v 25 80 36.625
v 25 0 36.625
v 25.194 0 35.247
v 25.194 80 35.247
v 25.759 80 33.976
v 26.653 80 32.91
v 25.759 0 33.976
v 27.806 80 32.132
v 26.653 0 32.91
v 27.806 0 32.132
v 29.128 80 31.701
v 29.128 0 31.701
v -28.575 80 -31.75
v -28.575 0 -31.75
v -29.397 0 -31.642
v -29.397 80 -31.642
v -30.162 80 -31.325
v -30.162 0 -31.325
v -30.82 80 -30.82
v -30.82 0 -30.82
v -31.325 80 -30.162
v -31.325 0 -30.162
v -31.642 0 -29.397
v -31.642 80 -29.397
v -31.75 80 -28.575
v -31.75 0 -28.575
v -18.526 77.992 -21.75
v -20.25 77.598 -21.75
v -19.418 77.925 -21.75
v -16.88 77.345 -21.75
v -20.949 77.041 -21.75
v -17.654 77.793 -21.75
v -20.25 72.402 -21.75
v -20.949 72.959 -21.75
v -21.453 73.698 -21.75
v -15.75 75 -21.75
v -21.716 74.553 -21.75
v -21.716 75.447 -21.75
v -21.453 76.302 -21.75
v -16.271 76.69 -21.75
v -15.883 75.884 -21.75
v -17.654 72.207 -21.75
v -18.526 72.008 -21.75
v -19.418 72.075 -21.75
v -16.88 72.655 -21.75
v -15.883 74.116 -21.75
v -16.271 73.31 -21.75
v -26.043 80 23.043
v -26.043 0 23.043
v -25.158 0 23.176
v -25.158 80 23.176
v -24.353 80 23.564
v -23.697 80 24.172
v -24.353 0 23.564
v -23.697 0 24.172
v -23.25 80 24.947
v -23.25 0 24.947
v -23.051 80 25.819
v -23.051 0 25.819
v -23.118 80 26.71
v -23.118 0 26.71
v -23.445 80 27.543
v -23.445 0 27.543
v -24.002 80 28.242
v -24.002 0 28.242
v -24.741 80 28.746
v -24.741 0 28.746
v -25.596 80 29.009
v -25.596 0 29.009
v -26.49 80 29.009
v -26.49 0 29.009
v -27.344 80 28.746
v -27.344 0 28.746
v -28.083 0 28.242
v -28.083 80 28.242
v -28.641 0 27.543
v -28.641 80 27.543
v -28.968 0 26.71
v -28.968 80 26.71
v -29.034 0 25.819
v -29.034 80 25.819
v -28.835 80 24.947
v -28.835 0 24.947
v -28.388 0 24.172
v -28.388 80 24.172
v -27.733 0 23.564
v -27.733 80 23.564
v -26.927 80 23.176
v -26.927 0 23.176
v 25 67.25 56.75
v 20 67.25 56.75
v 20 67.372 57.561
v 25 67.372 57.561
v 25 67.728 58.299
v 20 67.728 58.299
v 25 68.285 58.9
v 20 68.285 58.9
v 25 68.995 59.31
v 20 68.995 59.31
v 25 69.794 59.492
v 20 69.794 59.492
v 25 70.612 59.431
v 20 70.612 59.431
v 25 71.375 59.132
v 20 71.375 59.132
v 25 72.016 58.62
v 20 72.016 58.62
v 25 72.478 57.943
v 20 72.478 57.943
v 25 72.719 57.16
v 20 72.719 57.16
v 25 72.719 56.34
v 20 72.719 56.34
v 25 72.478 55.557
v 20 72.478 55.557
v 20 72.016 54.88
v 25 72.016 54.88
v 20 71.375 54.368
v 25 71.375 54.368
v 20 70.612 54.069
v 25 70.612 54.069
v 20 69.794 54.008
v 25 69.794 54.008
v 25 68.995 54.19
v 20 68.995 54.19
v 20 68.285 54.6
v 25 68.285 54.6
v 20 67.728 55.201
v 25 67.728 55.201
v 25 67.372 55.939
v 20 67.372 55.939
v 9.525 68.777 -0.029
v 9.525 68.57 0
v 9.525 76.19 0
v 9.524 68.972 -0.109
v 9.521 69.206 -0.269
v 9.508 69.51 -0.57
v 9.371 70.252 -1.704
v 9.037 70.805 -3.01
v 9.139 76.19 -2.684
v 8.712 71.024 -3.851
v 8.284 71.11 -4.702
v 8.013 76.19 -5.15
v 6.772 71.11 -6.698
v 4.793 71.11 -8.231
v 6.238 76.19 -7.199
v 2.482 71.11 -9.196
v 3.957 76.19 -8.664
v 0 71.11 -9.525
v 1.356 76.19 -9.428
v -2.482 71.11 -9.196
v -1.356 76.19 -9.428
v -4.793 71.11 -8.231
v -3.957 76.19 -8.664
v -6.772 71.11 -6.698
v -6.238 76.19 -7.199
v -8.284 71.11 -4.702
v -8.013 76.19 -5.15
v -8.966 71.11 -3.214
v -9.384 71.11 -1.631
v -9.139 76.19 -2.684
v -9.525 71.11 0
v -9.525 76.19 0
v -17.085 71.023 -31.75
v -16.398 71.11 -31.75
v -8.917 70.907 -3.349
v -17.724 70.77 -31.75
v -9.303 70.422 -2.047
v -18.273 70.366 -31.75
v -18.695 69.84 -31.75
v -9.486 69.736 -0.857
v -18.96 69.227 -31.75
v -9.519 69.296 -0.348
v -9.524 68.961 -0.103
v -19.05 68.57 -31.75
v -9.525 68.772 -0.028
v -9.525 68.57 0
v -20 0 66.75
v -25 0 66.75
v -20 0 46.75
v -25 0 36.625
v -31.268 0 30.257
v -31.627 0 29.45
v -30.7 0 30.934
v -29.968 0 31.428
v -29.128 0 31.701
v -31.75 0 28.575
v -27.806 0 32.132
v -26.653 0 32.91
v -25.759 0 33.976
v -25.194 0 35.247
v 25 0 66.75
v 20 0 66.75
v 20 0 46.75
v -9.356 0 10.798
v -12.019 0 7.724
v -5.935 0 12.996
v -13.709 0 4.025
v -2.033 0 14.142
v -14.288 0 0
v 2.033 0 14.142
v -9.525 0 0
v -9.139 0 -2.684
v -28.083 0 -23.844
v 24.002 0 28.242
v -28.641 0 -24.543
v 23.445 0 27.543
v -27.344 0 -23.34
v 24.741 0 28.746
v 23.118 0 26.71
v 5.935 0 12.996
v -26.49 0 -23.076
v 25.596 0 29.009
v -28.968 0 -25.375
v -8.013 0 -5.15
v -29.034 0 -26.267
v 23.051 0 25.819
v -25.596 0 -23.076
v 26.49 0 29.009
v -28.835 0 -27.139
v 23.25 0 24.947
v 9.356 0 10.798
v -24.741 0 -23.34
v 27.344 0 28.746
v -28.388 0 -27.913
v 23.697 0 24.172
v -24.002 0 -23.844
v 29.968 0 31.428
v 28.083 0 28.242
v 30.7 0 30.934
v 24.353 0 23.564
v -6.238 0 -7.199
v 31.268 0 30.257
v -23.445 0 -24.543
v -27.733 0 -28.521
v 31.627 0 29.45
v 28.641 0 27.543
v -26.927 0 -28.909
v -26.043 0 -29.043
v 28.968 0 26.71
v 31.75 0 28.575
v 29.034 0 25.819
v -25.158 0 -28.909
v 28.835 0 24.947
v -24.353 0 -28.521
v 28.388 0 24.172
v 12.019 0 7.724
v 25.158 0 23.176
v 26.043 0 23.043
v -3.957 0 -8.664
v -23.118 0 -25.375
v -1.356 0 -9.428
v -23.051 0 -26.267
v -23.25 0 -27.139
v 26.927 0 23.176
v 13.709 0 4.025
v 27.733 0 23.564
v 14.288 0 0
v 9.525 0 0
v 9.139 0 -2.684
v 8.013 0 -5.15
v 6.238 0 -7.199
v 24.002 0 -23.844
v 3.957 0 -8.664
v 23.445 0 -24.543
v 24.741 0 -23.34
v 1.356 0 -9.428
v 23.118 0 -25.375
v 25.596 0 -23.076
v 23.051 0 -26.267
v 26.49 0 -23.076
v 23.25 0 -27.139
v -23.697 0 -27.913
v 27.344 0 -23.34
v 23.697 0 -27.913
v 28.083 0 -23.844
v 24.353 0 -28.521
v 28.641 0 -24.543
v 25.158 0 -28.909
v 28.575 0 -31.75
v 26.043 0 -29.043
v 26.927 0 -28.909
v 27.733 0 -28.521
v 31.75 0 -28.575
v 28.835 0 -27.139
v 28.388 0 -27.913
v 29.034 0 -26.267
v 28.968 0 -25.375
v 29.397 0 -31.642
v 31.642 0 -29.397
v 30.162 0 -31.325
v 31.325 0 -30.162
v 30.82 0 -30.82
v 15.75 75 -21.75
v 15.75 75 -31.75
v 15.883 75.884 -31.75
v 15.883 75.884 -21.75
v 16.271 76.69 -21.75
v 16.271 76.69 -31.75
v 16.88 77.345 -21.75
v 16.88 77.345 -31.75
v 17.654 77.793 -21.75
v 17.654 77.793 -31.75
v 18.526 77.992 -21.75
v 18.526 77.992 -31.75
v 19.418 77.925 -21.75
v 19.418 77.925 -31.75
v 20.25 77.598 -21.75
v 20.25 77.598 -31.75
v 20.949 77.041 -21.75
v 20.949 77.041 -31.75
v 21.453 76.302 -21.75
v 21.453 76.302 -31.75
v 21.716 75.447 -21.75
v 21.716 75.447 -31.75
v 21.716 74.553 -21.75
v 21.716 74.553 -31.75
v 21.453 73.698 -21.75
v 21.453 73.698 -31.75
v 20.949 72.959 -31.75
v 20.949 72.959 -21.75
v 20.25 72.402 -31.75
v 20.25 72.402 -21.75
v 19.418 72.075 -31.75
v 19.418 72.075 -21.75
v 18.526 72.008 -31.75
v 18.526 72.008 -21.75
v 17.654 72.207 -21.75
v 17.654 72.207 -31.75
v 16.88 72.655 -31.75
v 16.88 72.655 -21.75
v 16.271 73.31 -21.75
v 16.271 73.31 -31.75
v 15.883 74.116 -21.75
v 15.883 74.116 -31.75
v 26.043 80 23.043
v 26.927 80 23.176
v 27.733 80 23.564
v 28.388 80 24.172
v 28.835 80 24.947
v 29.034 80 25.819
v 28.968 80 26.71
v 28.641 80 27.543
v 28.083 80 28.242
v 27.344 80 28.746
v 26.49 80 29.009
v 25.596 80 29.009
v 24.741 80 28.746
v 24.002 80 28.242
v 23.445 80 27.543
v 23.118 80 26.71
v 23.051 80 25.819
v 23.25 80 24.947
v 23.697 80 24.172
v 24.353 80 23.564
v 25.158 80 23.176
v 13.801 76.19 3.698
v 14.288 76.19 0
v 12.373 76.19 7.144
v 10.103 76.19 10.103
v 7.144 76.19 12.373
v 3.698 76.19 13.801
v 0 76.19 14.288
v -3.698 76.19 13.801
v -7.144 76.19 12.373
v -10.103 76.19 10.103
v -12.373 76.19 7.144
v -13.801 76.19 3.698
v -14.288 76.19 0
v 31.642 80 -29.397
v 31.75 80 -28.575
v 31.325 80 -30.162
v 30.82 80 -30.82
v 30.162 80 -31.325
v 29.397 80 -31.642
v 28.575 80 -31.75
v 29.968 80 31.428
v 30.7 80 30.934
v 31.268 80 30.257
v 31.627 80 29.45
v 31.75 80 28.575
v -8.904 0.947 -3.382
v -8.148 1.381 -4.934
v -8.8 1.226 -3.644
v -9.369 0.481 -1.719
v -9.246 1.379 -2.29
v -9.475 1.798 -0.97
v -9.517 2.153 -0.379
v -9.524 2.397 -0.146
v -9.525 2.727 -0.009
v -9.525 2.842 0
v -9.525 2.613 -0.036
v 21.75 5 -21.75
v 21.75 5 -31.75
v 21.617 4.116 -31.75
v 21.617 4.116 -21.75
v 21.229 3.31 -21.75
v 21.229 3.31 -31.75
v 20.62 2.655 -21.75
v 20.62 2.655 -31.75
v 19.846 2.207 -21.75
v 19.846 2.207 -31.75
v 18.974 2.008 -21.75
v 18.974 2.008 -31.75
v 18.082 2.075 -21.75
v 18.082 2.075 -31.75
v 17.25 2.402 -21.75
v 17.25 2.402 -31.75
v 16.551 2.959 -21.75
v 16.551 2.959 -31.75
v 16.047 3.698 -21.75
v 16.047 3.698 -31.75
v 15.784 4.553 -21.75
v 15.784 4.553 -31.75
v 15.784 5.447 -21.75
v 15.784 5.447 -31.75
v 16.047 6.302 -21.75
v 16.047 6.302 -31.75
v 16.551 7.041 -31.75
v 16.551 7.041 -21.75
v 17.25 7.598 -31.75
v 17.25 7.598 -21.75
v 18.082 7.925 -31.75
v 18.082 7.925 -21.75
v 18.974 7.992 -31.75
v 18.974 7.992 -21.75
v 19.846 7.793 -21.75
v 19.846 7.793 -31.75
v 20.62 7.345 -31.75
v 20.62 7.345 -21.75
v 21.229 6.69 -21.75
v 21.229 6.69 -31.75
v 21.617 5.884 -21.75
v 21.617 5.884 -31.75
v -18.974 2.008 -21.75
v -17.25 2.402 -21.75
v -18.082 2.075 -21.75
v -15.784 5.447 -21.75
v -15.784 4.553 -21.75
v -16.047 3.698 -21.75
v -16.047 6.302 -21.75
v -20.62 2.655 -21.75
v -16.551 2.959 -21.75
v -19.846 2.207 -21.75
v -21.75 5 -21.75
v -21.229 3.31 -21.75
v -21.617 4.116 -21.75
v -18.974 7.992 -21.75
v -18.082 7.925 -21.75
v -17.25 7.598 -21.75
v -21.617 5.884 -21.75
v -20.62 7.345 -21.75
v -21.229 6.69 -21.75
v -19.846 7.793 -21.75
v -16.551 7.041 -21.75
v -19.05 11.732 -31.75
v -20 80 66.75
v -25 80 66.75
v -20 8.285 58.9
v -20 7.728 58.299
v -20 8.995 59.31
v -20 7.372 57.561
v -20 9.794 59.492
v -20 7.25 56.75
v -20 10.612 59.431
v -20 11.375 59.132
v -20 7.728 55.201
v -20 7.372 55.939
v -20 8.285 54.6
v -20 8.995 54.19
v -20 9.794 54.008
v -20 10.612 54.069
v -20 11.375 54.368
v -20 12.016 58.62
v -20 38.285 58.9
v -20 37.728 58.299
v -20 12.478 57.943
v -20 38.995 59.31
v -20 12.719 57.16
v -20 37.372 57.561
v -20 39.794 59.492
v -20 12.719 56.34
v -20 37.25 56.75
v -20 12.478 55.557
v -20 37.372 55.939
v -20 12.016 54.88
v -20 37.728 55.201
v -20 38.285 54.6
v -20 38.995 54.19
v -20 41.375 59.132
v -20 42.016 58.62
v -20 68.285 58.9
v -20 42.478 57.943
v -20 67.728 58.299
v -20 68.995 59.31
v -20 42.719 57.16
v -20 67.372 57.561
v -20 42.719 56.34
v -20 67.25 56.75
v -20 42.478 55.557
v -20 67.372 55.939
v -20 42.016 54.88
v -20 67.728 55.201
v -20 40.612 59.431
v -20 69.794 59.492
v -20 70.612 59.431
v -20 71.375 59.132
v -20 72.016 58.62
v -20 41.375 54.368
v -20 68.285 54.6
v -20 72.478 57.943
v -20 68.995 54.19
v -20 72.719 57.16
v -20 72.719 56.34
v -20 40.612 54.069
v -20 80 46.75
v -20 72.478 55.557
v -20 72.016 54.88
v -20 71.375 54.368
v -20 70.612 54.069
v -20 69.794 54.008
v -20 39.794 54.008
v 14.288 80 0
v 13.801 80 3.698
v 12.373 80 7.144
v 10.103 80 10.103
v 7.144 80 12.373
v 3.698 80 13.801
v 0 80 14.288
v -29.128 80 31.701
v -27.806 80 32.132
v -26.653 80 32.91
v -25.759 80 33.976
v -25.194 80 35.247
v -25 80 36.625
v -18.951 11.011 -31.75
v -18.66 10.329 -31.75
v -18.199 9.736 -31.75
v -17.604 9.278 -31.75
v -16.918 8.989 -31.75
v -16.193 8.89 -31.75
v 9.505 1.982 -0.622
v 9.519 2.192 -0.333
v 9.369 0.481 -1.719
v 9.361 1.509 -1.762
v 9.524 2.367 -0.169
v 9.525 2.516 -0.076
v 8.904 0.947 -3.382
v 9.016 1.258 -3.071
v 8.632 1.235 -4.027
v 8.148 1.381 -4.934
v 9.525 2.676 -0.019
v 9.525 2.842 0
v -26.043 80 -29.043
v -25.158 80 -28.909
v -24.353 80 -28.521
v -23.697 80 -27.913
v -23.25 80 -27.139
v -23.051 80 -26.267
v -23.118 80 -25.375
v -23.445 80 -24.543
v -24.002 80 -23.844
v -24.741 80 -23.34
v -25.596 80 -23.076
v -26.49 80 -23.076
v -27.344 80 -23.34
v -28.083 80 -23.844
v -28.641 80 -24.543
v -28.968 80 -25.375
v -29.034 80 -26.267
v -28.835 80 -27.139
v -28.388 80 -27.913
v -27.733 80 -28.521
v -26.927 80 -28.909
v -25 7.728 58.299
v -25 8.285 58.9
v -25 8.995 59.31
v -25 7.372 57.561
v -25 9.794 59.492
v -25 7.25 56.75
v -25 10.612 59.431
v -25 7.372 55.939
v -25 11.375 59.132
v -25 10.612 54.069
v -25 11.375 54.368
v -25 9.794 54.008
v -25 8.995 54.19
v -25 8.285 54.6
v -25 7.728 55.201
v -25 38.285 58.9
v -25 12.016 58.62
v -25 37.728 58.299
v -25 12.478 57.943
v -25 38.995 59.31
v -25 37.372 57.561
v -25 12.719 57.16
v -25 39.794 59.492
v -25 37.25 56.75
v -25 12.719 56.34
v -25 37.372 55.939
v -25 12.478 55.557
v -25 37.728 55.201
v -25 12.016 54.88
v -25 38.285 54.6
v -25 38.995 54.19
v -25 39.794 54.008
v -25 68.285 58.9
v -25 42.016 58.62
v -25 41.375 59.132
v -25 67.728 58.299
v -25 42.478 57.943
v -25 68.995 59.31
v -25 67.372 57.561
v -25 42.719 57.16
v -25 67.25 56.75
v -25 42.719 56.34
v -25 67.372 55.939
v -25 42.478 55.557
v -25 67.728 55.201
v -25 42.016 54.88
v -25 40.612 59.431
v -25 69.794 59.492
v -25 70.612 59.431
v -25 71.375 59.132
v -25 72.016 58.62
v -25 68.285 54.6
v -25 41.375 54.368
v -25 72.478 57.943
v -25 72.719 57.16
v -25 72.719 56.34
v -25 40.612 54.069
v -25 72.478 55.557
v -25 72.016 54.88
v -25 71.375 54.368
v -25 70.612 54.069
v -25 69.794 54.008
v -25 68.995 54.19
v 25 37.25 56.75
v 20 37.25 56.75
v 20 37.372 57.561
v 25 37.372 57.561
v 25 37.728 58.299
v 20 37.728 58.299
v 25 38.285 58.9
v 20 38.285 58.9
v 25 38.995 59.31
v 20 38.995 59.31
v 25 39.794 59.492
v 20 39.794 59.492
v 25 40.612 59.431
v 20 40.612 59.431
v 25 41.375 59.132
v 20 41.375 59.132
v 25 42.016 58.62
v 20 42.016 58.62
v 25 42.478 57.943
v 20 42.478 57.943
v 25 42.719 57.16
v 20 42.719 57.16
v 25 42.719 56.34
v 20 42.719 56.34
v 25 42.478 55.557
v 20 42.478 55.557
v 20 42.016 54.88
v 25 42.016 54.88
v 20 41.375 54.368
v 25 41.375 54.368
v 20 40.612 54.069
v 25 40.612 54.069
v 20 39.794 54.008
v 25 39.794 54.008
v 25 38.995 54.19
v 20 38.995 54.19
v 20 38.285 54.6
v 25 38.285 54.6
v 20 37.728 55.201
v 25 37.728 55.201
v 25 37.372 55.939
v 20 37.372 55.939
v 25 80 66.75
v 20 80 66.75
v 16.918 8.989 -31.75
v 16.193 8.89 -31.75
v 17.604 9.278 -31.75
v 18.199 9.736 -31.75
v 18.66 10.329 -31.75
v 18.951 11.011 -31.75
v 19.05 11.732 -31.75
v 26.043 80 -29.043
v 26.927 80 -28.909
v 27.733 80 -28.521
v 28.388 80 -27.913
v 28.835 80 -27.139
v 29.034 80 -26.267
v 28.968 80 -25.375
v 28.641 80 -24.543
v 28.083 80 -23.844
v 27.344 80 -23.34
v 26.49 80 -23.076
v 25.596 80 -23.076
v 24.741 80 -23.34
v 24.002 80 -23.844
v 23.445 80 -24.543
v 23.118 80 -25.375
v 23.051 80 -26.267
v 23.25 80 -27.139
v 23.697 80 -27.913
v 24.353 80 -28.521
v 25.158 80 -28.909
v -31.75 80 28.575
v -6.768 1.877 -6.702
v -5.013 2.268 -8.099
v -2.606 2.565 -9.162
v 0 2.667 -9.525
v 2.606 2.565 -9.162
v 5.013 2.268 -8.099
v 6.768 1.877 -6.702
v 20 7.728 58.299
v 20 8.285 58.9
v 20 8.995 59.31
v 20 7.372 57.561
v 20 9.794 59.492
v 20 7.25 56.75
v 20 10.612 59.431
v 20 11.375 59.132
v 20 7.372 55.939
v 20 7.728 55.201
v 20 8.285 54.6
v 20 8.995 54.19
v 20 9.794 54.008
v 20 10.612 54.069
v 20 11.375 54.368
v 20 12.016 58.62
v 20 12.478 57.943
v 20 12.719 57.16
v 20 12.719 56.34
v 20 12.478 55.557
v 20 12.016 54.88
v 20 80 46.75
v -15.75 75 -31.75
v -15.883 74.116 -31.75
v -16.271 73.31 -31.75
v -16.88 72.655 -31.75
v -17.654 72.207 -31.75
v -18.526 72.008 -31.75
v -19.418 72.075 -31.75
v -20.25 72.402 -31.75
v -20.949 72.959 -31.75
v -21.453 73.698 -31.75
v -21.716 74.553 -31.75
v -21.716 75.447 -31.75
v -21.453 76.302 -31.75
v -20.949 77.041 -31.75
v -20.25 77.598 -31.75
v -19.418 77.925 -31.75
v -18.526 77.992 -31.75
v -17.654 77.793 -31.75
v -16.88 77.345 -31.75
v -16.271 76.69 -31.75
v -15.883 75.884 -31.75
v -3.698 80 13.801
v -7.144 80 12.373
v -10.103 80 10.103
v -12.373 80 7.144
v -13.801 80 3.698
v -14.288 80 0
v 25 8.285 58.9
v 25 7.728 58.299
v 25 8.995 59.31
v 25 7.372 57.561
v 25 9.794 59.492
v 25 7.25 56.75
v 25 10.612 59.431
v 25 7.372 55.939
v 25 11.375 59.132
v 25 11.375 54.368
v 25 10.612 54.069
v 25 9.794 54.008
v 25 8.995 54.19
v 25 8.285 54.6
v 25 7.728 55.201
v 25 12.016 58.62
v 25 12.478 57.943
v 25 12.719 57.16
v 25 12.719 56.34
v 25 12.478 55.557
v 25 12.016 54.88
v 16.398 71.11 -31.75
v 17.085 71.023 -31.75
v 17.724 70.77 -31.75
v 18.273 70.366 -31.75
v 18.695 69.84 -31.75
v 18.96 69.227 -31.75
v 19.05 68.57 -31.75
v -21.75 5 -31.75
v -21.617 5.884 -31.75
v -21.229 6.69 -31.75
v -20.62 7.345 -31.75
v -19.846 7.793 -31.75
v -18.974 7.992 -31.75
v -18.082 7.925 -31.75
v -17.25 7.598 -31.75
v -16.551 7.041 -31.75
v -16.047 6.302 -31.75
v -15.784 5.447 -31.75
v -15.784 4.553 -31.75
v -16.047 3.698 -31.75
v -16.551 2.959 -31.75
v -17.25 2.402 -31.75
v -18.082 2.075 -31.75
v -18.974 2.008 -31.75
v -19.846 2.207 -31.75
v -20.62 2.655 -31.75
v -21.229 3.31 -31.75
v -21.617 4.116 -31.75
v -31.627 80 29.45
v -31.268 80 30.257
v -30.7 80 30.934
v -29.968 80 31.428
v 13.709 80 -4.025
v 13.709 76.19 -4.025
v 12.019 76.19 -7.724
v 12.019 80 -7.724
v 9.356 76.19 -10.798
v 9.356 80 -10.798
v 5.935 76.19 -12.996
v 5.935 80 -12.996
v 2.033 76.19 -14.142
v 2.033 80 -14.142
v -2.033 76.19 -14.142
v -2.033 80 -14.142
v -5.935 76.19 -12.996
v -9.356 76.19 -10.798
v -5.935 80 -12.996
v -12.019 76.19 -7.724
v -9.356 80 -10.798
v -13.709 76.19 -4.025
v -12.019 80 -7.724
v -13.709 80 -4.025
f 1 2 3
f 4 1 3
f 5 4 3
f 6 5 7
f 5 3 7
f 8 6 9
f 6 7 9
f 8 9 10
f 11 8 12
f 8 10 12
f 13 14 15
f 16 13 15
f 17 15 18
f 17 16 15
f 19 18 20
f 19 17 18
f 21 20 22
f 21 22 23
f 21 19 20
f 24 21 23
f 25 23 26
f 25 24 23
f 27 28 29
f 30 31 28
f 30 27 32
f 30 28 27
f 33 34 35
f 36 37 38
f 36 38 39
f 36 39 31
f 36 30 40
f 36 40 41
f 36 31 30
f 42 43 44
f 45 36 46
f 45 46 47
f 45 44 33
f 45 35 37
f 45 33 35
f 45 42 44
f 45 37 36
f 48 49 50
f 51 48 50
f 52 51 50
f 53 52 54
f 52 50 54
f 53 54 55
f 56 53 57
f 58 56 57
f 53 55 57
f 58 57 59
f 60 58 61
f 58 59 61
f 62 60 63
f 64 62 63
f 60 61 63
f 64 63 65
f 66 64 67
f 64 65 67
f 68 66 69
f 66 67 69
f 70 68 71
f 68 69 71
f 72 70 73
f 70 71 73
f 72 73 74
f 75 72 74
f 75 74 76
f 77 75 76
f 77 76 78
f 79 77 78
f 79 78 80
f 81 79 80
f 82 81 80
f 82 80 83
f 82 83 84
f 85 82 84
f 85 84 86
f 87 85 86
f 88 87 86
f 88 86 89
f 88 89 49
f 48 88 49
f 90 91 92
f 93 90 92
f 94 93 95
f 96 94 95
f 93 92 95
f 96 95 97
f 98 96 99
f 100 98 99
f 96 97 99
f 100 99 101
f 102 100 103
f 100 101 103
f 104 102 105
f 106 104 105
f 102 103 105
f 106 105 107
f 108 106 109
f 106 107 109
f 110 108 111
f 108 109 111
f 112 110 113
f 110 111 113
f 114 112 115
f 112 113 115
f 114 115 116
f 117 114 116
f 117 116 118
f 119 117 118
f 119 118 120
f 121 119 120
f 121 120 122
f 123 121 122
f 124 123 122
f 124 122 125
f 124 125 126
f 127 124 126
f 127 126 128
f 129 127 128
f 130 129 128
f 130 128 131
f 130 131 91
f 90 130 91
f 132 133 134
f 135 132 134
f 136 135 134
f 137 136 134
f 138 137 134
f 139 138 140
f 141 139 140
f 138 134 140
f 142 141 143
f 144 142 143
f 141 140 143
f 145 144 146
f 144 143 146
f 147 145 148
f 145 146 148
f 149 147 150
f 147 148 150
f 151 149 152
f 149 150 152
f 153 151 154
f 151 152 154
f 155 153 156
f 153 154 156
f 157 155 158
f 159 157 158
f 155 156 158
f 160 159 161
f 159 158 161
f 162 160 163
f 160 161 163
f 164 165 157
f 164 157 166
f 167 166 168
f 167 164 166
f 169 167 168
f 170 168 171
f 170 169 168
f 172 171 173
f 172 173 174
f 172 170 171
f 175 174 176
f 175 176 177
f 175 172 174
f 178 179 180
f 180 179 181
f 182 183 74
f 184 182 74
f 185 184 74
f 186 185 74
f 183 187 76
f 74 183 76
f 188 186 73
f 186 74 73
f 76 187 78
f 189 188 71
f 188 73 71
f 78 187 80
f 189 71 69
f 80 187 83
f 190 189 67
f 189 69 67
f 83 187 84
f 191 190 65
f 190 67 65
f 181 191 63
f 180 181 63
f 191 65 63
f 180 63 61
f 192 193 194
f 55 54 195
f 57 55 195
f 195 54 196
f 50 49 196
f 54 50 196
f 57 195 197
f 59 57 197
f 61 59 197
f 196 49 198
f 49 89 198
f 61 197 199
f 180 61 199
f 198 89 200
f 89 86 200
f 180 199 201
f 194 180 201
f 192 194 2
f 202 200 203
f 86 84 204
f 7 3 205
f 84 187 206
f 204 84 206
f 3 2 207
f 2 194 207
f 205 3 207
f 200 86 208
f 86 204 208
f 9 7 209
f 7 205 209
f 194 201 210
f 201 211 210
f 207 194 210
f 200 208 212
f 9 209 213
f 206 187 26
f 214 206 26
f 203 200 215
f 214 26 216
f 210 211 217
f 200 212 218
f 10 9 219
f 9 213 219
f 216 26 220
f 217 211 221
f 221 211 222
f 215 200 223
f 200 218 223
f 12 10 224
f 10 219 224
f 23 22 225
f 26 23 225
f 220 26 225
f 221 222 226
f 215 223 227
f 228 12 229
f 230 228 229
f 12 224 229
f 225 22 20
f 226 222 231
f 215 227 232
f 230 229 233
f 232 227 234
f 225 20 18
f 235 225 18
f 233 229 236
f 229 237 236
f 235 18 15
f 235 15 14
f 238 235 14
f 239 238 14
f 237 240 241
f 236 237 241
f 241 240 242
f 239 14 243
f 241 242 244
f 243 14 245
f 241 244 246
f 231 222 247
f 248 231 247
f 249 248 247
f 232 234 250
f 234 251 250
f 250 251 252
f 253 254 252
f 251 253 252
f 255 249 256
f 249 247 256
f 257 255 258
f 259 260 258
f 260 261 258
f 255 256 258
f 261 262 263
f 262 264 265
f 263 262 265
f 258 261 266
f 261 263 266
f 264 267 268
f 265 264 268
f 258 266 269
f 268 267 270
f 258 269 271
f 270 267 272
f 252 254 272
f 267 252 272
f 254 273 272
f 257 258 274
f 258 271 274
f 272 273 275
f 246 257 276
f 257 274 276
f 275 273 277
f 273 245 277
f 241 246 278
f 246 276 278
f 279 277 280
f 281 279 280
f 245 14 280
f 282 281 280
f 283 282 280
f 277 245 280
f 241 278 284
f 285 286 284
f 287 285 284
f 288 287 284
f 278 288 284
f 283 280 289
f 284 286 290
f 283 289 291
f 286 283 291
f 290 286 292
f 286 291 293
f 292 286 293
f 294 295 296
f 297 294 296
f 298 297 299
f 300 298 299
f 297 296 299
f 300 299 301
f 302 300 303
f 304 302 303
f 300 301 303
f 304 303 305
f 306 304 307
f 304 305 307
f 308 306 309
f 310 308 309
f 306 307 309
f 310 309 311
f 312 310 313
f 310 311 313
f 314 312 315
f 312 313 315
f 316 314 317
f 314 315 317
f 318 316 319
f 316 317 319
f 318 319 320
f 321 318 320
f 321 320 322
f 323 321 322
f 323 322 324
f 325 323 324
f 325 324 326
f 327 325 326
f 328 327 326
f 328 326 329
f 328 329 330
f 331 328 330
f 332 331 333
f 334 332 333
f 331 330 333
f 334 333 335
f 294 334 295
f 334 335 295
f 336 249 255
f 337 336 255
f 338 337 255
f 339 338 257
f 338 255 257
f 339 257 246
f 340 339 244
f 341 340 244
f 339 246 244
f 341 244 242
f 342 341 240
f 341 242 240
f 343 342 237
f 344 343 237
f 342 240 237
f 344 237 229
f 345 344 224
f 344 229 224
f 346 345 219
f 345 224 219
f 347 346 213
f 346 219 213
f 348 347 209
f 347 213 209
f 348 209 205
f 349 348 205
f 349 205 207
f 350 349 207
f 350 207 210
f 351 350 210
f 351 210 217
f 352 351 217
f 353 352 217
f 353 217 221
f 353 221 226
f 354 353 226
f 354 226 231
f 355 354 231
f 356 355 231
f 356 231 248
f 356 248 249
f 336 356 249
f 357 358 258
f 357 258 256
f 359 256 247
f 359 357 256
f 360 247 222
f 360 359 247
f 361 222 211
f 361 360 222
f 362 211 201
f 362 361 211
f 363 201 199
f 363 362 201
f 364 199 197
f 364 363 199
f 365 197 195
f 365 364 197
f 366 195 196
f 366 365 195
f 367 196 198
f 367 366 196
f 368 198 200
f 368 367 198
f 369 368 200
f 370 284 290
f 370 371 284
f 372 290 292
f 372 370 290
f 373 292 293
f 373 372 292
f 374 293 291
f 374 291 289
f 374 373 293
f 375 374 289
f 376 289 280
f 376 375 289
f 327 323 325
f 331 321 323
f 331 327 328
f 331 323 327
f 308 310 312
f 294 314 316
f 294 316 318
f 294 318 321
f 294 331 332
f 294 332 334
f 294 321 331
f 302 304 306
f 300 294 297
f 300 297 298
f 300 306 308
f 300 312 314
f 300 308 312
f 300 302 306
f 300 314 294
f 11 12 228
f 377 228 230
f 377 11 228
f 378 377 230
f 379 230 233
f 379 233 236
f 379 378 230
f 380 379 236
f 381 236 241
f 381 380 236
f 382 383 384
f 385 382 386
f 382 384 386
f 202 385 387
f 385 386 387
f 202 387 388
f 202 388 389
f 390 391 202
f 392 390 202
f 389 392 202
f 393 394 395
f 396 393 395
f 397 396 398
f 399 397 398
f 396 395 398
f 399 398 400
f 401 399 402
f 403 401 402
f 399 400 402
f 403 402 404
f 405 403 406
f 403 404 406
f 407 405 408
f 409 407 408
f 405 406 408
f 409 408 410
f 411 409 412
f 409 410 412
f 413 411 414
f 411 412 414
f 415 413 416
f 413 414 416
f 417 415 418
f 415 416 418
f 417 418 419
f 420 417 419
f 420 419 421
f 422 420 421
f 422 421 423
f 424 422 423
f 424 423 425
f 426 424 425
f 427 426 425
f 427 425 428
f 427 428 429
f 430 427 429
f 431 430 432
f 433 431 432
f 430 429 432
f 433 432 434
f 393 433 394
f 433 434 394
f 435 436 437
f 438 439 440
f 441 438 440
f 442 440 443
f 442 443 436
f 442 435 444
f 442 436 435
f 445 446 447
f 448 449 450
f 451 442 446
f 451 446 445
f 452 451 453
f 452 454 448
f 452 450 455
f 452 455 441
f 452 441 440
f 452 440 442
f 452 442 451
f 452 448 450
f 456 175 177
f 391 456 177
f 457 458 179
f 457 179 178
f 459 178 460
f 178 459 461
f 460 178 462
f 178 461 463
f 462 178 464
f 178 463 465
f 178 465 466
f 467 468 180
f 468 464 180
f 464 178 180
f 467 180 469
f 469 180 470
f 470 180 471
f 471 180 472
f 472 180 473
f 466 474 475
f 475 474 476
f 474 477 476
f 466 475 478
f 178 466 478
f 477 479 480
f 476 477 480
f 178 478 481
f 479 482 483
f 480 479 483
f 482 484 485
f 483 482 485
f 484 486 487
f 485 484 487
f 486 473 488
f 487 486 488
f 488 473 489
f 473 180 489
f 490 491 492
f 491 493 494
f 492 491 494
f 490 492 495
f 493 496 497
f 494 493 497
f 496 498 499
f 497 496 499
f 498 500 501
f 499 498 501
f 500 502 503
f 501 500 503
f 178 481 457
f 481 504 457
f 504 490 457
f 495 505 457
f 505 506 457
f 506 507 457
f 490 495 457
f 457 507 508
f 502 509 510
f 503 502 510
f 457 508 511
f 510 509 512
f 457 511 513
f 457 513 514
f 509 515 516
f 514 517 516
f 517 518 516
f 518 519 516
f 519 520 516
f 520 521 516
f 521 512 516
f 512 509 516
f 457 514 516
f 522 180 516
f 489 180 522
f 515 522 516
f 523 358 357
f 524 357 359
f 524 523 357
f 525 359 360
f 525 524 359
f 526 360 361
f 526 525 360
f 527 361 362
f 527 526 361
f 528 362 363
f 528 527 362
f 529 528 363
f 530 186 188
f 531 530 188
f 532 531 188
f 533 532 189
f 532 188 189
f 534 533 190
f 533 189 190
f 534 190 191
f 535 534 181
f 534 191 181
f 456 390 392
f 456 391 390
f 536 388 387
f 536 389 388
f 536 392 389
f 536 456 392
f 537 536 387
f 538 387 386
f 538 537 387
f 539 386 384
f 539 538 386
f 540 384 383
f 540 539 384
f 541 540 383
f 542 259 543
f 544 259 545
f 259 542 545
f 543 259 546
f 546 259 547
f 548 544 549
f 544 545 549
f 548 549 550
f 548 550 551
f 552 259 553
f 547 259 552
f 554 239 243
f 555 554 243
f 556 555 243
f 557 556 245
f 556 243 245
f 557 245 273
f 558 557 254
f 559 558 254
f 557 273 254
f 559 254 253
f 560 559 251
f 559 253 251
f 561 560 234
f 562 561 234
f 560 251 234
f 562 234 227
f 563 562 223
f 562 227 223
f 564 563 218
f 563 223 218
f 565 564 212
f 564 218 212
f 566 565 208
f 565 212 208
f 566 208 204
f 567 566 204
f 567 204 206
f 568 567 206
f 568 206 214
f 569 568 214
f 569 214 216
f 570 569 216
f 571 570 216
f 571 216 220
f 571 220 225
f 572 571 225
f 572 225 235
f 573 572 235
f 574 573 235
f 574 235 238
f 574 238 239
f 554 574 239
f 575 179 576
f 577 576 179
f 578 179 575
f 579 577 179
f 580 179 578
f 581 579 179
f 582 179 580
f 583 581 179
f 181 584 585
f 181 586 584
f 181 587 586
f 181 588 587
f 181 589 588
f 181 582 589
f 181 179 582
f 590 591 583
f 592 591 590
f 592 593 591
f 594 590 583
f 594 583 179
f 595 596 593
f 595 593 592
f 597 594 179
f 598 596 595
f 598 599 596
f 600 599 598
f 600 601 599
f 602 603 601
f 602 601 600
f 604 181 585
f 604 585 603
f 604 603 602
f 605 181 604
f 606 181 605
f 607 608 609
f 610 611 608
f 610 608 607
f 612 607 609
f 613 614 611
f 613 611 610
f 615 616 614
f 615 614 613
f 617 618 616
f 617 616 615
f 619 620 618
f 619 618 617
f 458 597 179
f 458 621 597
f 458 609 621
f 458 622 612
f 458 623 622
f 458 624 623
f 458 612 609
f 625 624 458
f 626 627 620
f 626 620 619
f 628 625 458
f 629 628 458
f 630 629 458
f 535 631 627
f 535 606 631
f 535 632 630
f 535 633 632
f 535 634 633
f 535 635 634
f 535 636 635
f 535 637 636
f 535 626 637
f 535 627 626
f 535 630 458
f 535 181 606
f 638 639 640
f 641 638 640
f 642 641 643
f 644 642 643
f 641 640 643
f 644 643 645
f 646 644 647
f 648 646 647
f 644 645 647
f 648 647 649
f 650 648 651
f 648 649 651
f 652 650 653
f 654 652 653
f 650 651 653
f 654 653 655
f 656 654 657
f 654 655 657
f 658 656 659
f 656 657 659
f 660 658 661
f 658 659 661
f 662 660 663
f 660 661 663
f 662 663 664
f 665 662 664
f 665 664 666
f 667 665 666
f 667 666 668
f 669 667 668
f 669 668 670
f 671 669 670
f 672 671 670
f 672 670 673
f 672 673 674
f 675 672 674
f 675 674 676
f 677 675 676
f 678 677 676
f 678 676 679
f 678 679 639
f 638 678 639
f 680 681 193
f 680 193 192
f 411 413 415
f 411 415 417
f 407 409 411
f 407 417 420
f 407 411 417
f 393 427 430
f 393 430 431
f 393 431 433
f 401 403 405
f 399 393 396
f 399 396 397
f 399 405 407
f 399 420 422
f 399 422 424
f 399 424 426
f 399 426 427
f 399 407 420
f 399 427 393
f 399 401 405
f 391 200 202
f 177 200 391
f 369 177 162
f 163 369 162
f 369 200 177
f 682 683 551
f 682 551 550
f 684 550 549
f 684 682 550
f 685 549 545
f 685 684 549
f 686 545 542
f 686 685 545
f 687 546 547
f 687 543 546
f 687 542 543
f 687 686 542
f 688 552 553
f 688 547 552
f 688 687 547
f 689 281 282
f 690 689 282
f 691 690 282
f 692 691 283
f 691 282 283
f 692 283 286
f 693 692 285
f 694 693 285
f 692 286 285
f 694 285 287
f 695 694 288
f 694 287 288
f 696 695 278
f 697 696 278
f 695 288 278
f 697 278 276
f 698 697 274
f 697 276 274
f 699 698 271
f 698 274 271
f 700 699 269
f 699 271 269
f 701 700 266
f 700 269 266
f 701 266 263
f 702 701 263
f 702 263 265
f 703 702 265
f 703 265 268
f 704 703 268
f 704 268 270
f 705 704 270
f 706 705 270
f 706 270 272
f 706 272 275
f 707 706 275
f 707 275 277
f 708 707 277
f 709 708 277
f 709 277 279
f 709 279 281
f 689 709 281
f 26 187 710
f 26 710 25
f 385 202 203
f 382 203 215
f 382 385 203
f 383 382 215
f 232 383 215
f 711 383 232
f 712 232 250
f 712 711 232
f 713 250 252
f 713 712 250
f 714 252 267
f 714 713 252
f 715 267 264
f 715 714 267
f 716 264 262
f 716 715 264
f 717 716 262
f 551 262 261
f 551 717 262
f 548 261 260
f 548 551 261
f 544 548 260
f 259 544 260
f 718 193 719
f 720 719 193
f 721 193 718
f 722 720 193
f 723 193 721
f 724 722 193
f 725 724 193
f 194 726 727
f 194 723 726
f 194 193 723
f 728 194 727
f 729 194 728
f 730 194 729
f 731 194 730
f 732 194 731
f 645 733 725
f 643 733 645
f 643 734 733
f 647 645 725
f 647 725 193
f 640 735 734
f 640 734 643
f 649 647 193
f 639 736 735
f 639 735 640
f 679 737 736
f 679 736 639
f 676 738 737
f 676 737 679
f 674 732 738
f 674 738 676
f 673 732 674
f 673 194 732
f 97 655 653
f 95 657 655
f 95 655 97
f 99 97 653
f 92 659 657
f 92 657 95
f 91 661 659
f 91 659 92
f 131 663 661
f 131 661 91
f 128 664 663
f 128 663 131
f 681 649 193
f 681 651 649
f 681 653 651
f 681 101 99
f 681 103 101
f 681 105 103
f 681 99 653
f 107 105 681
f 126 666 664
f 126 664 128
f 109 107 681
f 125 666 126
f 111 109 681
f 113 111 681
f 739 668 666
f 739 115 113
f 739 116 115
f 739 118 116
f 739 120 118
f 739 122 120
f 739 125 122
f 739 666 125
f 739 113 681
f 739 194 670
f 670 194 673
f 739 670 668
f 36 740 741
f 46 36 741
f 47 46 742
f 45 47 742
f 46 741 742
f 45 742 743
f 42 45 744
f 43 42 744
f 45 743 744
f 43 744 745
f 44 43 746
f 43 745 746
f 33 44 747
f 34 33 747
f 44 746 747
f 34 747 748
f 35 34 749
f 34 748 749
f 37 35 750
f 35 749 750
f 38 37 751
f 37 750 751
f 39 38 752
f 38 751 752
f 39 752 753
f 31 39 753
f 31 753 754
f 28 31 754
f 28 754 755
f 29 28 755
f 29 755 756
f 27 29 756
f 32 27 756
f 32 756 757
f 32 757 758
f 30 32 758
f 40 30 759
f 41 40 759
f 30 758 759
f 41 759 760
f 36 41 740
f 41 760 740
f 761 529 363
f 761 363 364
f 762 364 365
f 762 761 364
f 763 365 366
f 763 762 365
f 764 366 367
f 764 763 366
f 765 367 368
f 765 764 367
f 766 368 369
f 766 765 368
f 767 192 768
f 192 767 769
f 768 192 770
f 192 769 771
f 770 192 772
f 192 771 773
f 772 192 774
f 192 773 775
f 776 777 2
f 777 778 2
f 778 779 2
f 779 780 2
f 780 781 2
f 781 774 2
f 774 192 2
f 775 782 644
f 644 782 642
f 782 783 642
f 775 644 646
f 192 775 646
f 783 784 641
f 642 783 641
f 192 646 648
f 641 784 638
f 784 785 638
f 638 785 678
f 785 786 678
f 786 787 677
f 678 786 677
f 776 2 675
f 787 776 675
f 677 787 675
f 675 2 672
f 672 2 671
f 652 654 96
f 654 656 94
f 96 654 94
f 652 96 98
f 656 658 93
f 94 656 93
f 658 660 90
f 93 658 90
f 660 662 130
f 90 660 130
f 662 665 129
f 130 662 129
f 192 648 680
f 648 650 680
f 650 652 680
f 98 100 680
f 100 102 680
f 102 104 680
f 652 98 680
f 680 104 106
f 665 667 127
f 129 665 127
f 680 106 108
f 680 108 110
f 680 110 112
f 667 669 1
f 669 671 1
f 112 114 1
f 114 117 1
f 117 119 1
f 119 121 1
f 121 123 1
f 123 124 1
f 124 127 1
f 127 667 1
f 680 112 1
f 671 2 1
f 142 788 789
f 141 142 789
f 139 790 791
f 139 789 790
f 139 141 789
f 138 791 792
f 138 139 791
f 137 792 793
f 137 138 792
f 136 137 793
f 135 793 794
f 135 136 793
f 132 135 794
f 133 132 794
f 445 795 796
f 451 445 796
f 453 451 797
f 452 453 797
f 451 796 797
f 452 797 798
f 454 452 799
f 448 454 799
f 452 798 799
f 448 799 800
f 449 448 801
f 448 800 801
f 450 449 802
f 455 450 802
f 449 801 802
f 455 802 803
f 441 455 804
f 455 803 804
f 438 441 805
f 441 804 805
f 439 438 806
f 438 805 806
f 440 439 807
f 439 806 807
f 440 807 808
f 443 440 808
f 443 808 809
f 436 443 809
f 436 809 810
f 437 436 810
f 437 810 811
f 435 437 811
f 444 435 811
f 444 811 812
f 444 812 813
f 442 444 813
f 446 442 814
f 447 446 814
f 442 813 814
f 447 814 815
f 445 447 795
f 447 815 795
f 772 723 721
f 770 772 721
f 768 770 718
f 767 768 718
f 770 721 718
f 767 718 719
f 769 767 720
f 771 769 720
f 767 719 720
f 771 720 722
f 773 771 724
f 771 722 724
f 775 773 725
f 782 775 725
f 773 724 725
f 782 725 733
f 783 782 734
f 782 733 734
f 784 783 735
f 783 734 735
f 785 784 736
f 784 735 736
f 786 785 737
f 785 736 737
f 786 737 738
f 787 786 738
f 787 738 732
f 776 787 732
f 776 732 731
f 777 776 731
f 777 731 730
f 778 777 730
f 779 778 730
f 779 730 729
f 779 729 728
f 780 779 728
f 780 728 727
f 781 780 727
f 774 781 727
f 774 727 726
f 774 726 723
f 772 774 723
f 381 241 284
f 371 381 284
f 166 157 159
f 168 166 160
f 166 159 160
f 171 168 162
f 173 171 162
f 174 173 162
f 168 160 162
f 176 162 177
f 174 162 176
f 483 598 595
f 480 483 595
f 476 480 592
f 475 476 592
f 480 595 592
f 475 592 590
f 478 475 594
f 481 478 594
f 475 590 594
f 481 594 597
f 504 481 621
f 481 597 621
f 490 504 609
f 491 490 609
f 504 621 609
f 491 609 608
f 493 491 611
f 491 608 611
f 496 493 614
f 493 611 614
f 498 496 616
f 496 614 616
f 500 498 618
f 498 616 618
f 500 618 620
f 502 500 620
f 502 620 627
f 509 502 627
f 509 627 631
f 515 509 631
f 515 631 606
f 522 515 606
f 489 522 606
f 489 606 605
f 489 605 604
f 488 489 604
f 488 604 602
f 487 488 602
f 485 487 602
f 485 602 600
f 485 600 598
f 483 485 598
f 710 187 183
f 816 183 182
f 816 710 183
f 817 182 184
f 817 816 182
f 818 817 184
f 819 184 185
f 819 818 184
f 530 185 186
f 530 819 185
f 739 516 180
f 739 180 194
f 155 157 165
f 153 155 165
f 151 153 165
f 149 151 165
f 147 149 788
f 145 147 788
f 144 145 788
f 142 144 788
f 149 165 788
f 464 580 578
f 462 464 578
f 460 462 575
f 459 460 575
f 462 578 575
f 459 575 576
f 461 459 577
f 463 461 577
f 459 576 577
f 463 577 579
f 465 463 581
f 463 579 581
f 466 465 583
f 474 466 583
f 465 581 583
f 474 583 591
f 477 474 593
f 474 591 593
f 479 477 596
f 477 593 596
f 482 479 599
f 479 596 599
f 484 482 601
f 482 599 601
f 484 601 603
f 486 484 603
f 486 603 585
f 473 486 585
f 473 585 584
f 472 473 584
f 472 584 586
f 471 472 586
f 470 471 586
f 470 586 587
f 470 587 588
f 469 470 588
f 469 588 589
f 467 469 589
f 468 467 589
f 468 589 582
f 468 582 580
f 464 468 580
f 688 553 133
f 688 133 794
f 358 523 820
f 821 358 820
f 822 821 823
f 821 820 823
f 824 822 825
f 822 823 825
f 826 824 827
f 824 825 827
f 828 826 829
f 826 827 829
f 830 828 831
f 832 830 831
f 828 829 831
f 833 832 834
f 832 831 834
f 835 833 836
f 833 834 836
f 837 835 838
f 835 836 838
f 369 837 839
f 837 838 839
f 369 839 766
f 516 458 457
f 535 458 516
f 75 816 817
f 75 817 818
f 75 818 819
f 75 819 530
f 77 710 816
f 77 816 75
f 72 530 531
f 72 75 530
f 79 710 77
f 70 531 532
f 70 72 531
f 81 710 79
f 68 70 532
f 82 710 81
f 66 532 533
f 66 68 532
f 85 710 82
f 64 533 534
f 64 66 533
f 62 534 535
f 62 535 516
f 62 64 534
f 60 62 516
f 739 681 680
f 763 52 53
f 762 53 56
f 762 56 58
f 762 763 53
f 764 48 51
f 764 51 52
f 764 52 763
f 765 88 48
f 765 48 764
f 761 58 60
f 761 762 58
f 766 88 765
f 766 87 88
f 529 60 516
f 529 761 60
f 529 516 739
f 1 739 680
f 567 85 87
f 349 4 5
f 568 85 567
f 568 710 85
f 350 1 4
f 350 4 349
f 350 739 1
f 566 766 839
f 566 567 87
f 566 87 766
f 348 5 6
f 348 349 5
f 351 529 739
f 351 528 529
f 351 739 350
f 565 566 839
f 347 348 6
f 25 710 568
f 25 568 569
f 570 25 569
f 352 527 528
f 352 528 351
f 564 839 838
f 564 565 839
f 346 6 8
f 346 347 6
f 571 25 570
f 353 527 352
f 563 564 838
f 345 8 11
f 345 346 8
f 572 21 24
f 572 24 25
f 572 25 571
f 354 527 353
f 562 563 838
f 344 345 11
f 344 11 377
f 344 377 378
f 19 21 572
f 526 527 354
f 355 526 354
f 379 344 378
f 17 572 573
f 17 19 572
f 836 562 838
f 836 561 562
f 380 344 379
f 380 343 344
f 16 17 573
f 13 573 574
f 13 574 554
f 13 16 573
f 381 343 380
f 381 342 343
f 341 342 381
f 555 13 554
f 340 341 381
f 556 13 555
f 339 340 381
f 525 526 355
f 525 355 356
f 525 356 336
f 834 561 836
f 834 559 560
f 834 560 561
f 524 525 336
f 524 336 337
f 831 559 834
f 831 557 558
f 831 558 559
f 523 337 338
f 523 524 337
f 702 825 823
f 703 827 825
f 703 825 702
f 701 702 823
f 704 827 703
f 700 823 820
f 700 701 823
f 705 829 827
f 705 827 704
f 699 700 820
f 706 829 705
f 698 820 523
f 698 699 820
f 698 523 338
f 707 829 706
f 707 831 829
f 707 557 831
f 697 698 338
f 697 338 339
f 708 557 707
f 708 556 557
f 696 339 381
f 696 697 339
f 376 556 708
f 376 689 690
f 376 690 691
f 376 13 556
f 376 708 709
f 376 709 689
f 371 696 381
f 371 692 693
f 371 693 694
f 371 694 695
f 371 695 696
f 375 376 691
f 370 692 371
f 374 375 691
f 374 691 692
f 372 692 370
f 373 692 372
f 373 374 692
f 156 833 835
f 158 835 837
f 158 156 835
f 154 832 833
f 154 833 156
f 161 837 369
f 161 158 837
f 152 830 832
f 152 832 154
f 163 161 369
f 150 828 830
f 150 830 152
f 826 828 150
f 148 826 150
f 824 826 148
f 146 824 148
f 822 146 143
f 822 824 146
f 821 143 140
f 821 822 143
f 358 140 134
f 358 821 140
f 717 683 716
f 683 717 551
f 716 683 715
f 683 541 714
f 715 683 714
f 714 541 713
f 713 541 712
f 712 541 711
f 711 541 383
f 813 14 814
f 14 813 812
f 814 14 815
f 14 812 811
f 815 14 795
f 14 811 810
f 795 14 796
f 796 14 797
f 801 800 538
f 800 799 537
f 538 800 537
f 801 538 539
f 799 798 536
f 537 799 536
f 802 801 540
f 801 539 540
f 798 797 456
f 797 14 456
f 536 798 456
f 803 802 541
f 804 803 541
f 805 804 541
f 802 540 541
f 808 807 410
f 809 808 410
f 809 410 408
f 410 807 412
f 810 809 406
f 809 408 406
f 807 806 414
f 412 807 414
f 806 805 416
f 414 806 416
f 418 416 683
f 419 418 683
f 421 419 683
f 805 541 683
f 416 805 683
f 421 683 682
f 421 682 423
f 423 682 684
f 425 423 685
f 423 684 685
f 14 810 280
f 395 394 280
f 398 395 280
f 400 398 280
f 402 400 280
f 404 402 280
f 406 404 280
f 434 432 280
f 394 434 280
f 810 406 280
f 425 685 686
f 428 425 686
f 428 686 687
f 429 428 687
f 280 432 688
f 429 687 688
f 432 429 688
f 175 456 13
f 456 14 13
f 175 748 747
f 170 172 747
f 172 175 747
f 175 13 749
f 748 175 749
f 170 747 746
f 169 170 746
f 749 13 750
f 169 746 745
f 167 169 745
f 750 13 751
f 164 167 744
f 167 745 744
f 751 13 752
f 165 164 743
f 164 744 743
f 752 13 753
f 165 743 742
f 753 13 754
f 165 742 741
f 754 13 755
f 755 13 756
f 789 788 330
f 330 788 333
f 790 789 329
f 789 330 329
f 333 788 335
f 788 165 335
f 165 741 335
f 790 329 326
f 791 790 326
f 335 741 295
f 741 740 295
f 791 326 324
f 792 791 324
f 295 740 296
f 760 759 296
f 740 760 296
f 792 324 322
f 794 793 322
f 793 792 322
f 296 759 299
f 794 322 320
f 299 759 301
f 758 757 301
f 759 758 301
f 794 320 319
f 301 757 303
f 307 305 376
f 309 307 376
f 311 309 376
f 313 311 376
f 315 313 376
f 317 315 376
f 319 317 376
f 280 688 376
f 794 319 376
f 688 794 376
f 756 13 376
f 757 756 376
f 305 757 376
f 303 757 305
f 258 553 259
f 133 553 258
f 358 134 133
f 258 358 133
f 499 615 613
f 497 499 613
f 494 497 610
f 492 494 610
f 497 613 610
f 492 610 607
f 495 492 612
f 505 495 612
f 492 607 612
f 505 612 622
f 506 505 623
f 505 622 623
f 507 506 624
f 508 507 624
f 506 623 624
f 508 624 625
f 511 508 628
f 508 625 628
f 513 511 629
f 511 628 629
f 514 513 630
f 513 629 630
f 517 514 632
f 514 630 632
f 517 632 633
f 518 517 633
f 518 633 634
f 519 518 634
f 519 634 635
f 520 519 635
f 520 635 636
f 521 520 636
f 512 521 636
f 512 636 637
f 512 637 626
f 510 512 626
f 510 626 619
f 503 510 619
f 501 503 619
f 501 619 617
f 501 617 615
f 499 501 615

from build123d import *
from build123d.topology import SkipClean

# Parameters (mm, degrees)
SKETCH2_W                      = 63.5
SKETCH2_H                      = 63.5
BOSS_EXTRUDE1_DEPTH            = 80
CUT_EXTRUDE1_REACH             = 93.739
SKETCH4_R                      = 14.2875
CUT_EXTRUDE2_DEPTH             = 3.81
CUT_EXTRUDE3_DEPTH             = 62.22
CUT_EXTRUDE4_REACH             = 93.739
CUT_EXTRUDE4_DIRECTION_2_REACH = 93.739
FILLET2_R                      = 2.54
SKETCH9_W                      = 5
SKETCH9_H                      = 80
BOSS_EXTRUDE2_DEPTH            = 35
SKETCH10_R                     = 2.75
CUT_EXTRUDE6_DEPTH             = 119.642846392
CUT_EXTRUDE7_REACH             = 110.92
SKETCH11_R                     = 3
SKETCH12_W                     = 40
SKETCH12_H                     = 80
BOSS_EXTRUDE3_DEPTH            = 15
SKETCH13_R                     = 3
CUT_EXTRUDE8_DEPTH             = 10
FILLET3_R                      = 3.175
FILLET4_DEPTH                  = 80


with BuildPart() as part:
    # Sketch2 → Boss-Extrude1 (new body)
    with BuildSketch(Plane(origin=(0, 0, 0), x_dir=(1, 0, 0), z_dir=(0, 1, 0))):
        Rectangle(SKETCH2_W, SKETCH2_H)
    extrude(amount=BOSS_EXTRUDE1_DEPTH)

    # Sketch3 → Cut-Extrude1 (cut, up to next)
    with BuildSketch(Plane(origin=(0, 80, 0), x_dir=(1, 0, 0), z_dir=(0, 1, 0)), mode=Mode.PRIVATE) as cut_extrude1_sk1:
        with BuildLine():
            Line((9.525, 0), (14.2875, 0))
            ThreePointArc((14.2875, 0), (0, -14.2875), (-14.2875, 0))
            Line((-14.2875, 0), (-9.525, 0))
            ThreePointArc((-9.525, 0), (0, 9.525), (9.525, 0))
        make_face()
    cut_extrude1_tool1 = extrude(cut_extrude1_sk1.sketch, amount=-CUT_EXTRUDE1_REACH, mode=Mode.PRIVATE) & part.part
    add(cut_extrude1_tool1.solids().sort_by_distance((0, 80, 2.954161))[0], mode=Mode.SUBTRACT)

    # Sketch4 → Cut-Extrude2 (cut)
    with BuildSketch(Plane(origin=(0, 80, 0), x_dir=(1, 0, 0), z_dir=(0, 1, 0))):
        with Locations(Location((0, 0, 0), (0, 0, 270))):
            Circle(SKETCH4_R)
    extrude(amount=-CUT_EXTRUDE2_DEPTH, mode=Mode.SUBTRACT)

    # Sketch6 → Cut-Extrude3 (cut)
    with BuildSketch(Plane(origin=(0, 71.11, 0), x_dir=(1, 0, 0), z_dir=(0, 1, 0))):
        with BuildLine():
            Line((9.525, 0), (19.05, 31.75))
            Line((19.05, 31.75), (-19.05, 31.75))
            Line((-19.05, 31.75), (-9.525, 0))
            ThreePointArc((-9.525, 0), (0, 9.525), (9.525, 0))
        make_face()
    extrude(amount=-CUT_EXTRUDE3_DEPTH, mode=Mode.SUBTRACT)

    # Cut-Extrude4: up to this plane
    with SkipClean():  # the faces are left unmerged after this step: merging them gives an invalid solid
        cut_extrude4_end = Plane(origin=(-9.525, -49.595085442, 0), z_dir=(-0.9578262852211514, 0, 0.2873478855663456))
        # Sketch7 → Cut-Extrude4 (cut, up to the surface)
        with BuildSketch(Plane(origin=(0, 0, 0), x_dir=(0, 0, -1), z_dir=(1, 0, 0)), mode=Mode.PRIVATE) as cut_extrude4_sk1:
            Polygon((0, 8.89), (31.75, 8.89), (0, 0), align=None)
        cut_extrude4_tool1 = split(extrude(cut_extrude4_sk1.sketch, amount=-CUT_EXTRUDE4_REACH, mode=Mode.PRIVATE), bisect_by=cut_extrude4_end, keep=Keep.BOTH, mode=Mode.PRIVATE)
        add(cut_extrude4_tool1.solids().sort_by_distance((0, 5.926667, -10.583333))[0], mode=Mode.SUBTRACT)

    # Cut-Extrude4 direction 2: up to this plane
    cut_extrude4_direction_2_end = Plane(origin=(9.525, -49.595085442, 0), z_dir=(0.9578262852211514, 0, 0.2873478855663456))
    # Sketch7 → Cut-Extrude4 direction 2 (cut, up to the surface)
    with BuildSketch(Plane(origin=(0, 0, 0), x_dir=(0, 0, -1), z_dir=(1, 0, 0)), mode=Mode.PRIVATE) as cut_extrude4_direction_2_sk1:
        Polygon((0, 8.89), (31.75, 8.89), (0, 0), align=None)
    cut_extrude4_direction_2_tool1 = split(extrude(cut_extrude4_direction_2_sk1.sketch, amount=CUT_EXTRUDE4_DIRECTION_2_REACH, mode=Mode.PRIVATE), bisect_by=cut_extrude4_direction_2_end, keep=Keep.BOTH, mode=Mode.PRIVATE)
    add(cut_extrude4_direction_2_tool1.solids().sort_by_distance((0, 5.926667, -10.583333))[0], mode=Mode.SUBTRACT)

    # Fillet2
    # the kernel refuses this fillet: 2.54 mm, written as the material it adds along each edge
    with BuildSketch(Plane(origin=(7.700340927, 71.11, 6.082196911), x_dir=(-0.9578262852211513, 0, -0.2873478855663455), z_dir=(0.28734788556634555, 0, -0.9578262852211513))) as fillet2_piece_1_section:
        with BuildLine():
            CenterArc((FILLET2_R, -FILLET2_R), FILLET2_R, 90, 90)
            Line((0, -FILLET2_R), (0, 0))
            Line((0, 0), (FILLET2_R, 0))
        make_face()
    fillet2_piece_1 = extrude(amount=45.847973166, mode=Mode.PRIVATE)
    fillet2_piece_1 = split(fillet2_piece_1, bisect_by=Plane(origin=(7.700340927, 71.11, -31.75), z_dir=(0, 0, 1)), keep=Keep.TOP, mode=Mode.PRIVATE)
    fillet2_piece_1 = fillet2_piece_1 - Plane(origin=(0, 71.11, 0), x_dir=(-1, 0, 0), z_dir=(0, 1, 0)) * Cylinder(9.525, 102, mode=Mode.PRIVATE)
    fillet2_piece_1 = split(fillet2_piece_1, bisect_by=Plane(origin=(7.700340927, 71.11, 0), z_dir=(0, 0, -1)), keep=Keep.TOP, mode=Mode.PRIVATE)
    add(fillet2_piece_1)
    with BuildSketch(Plane(origin=(-20.874659073, 71.11, -37.832196911), x_dir=(0, -1, 0), z_dir=(0.28734788556634555, 0, 0.9578262852211513))) as fillet2_piece_2_section:
        with BuildLine():
            CenterArc((FILLET2_R, FILLET2_R), FILLET2_R, 180, 90)
            Line((0, FILLET2_R), (0, 0))
            Line((0, 0), (FILLET2_R, 0))
        make_face()
    fillet2_piece_2 = extrude(amount=45.847973166, mode=Mode.PRIVATE)
    fillet2_piece_2 = split(fillet2_piece_2, bisect_by=Plane(origin=(-20.874659073, 71.11, -31.75), z_dir=(0, 0, 1)), keep=Keep.TOP, mode=Mode.PRIVATE)
    fillet2_piece_2 = split(fillet2_piece_2, bisect_by=Plane(origin=(-20.874659073, 71.11, 0), z_dir=(0, 0, -1)), keep=Keep.TOP, mode=Mode.PRIVATE)
    fillet2_piece_2 = fillet2_piece_2 - Plane(origin=(0, 71.11, 0), x_dir=(-1, 0, 0), z_dir=(0, 1, 0)) * Cylinder(9.525, 102, mode=Mode.PRIVATE)
    add(fillet2_piece_2)
    with BuildSketch(Plane(origin=(-20.954648619, 10.667672044, -38.098828729), x_dir=(0.9607141016314922, 0.07483307171461691, -0.2672609704093551), z_dir=(0.2775399339309484, -0.2590372716688848, 0.9251331131031606))) as fillet2_piece_3_section:
        with BuildLine():
            CenterArc((FILLET2_R * 1.08072615035, FILLET2_R), FILLET2_R, 175.556407911, 94.443592089)
            Line((FILLET2_R * 0.0837320564804, FILLET2_R * 1.07747758898), (0, 0))
            Line((0, 0), (FILLET2_R * 1.08072615035, 0))
        make_face()
    fillet2_piece_3 = extrude(amount=52.848435405, mode=Mode.PRIVATE)
    fillet2_piece_3 = split(fillet2_piece_3, bisect_by=Plane(origin=(-20.954648619, 10.667672044, -31.75), z_dir=(0, 0, 1)), keep=Keep.TOP, mode=Mode.PRIVATE)
    fillet2_piece_3 = fillet2_piece_3 - Plane(origin=(0, 10.667672044, 0), x_dir=(-1, 0, 0), z_dir=(0, 1, 0)) * Cylinder(9.525, 117, mode=Mode.PRIVATE)
    fillet2_piece_3 = split(fillet2_piece_3, bisect_by=Plane(origin=(-20.954648619, 10.667672044, 0), z_dir=(0, 0, -1)), keep=Keep.TOP, mode=Mode.PRIVATE)
    add(fillet2_piece_3)
    with BuildSketch(Plane(origin=(20.954648619, 10.667672044, -38.098828729), x_dir=(-0.9607141016314922, 0.07483307171461691, -0.2672609704093551), z_dir=(-0.2775399339309484, -0.2590372716688848, 0.9251331131031606))) as fillet2_piece_4_section:
        with BuildLine():
            CenterArc((FILLET2_R * 1.08072615035, -FILLET2_R), FILLET2_R, 90, 94.443592089)
            Line((FILLET2_R * 0.0837320564804, -FILLET2_R * 1.07747758898), (0, 0))
            Line((0, 0), (FILLET2_R * 1.08072615035, 0))
        make_face()
    fillet2_piece_4 = extrude(amount=52.848435405, mode=Mode.PRIVATE)
    fillet2_piece_4 = split(fillet2_piece_4, bisect_by=Plane(origin=(20.954648619, 10.667672044, -31.75), z_dir=(0, 0, 1)), keep=Keep.TOP, mode=Mode.PRIVATE)
    fillet2_piece_4 = fillet2_piece_4 - Plane(origin=(0, 10.667672044, 0), x_dir=(-1, 0, 0), z_dir=(0, 1, 0)) * Cylinder(9.525, 117, mode=Mode.PRIVATE)
    fillet2_piece_4 = split(fillet2_piece_4, bisect_by=Plane(origin=(20.954648619, 10.667672044, 0), z_dir=(0, 0, -1)), keep=Keep.TOP, mode=Mode.PRIVATE)
    add(fillet2_piece_4)

    # Sketch9 → Boss-Extrude2 (add)
    with BuildSketch(Plane.XY.offset(31.75)):
        with Locations((-22.5, 40)):
            Rectangle(SKETCH9_W, SKETCH9_H)
        with Locations((22.5, 40)):
            Rectangle(SKETCH9_W, SKETCH9_H)
    extrude(amount=BOSS_EXTRUDE2_DEPTH)

    # Sketch10 → Cut-Extrude6 (cut, through all)
    with BuildSketch(Plane.ZY.offset(25)):
        with Locations(Location((56.75, 70, 0), (0, 0, 270))):
            Circle(SKETCH10_R)
        with Locations(Location((56.75, 10, 0), (0, 0, 270))):
            Circle(SKETCH10_R)
        with Locations(Location((56.75, 40, 0), (0, 0, 270))):
            Circle(SKETCH10_R)
    extrude(amount=-CUT_EXTRUDE6_DEPTH, mode=Mode.SUBTRACT)

    # Sketch11 → Cut-Extrude7 (cut, up to next)
    with BuildSketch(Plane.XZ, mode=Mode.PRIVATE) as cut_extrude7_sk1:
        with Locations(Location((26.042742751, -26.042742751, 0), (0, 0, 270))):
            Circle(SKETCH11_R)
    cut_extrude7_tool1 = extrude(cut_extrude7_sk1.sketch, amount=-CUT_EXTRUDE7_REACH, mode=Mode.PRIVATE) & part.part
    # Sketch11 → Cut-Extrude7 (cut, up to next)
    with BuildSketch(Plane.XZ, mode=Mode.PRIVATE) as cut_extrude7_sk2:
        with Locations(Location((26.042742751, 26.042742751, 0), (0, 0, 270))):
            Circle(SKETCH11_R)
    cut_extrude7_tool2 = extrude(cut_extrude7_sk2.sketch, amount=-CUT_EXTRUDE7_REACH, mode=Mode.PRIVATE) & part.part
    # Sketch11 → Cut-Extrude7 (cut, up to next)
    with BuildSketch(Plane.XZ, mode=Mode.PRIVATE) as cut_extrude7_sk3:
        with Locations(Location((-26.042742751, -26.042742751, 0), (0, 0, 270))):
            Circle(SKETCH11_R)
    cut_extrude7_tool3 = extrude(cut_extrude7_sk3.sketch, amount=-CUT_EXTRUDE7_REACH, mode=Mode.PRIVATE) & part.part
    # Sketch11 → Cut-Extrude7 (cut, up to next)
    with BuildSketch(Plane.XZ, mode=Mode.PRIVATE) as cut_extrude7_sk4:
        with Locations(Location((-26.042742751, 26.042742751, 0), (0, 0, 270))):
            Circle(SKETCH11_R)
    cut_extrude7_tool4 = extrude(cut_extrude7_sk4.sketch, amount=-CUT_EXTRUDE7_REACH, mode=Mode.PRIVATE) & part.part
    add(cut_extrude7_tool1.solids().sort_by_distance((26.042743, 0, -26.042743))[0], mode=Mode.SUBTRACT)
    add(cut_extrude7_tool2.solids().sort_by_distance((26.042743, 0, 26.042743))[0], mode=Mode.SUBTRACT)
    add(cut_extrude7_tool3.solids().sort_by_distance((-26.042743, 0, -26.042743))[0], mode=Mode.SUBTRACT)
    add(cut_extrude7_tool4.solids().sort_by_distance((-26.042743, 0, 26.042743))[0], mode=Mode.SUBTRACT)

    # Sketch12 → Boss-Extrude3 (add)
    with BuildSketch(Plane.XY.offset(31.75)):
        with Locations((0, 40)):
            Rectangle(SKETCH12_W, SKETCH12_H)
    extrude(amount=BOSS_EXTRUDE3_DEPTH)

    # Sketch13 → Cut-Extrude8 (cut)
    with BuildSketch(Plane(origin=(0, 0, -31.75), x_dir=(-1, 0, 0), z_dir=(0, 0, -1))):
        with Locations((-18.75, 75)):
            Circle(SKETCH13_R)
        with Locations(Location((18.75, 75, 0), (0, 0, 180))):
            Circle(SKETCH13_R)
        with Locations((18.75, 5)):
            Circle(SKETCH13_R)
        with Locations(Location((-18.75, 5, 0), (0, 0, 180))):
            Circle(SKETCH13_R)
    extrude(amount=-CUT_EXTRUDE8_DEPTH, mode=Mode.SUBTRACT)

    # Fillet3
    fillet3_edges = [part.edges().sort_by_distance(p)[0] for p in [
        (31.75, 40, 31.75),
        (-31.75, 40, 31.75),
        (-31.75, 40, -31.75),
        (31.75, 40, -31.75),
    ]]
    fillet(fillet3_edges, radius=FILLET3_R)

    # Fillet4: read off the stored shape, not the designer's step
    # Fillet4 outline → Fillet4 (add)
    with BuildSketch(Plane(origin=(0, 0, 0), x_dir=(1, 0, 0), z_dir=(0, 1, 0))):
        with BuildLine():
            Line((25, -31.75), (25, -36.624844719))
            ThreePointArc((25, -36.624844719), (26.168694859, -33.412197692), (29.128440367, -31.701392291))
            ThreePointArc((29.128440367, -31.701392291), (28.852785416, -31.737824728), (28.575, -31.75))
            Line((28.575, -31.75), (25, -31.75))
        make_face()
        with BuildLine():
            ThreePointArc((-28.575, -31.75), (-28.852785416, -31.737824728), (-29.128440367, -31.701392291))
            ThreePointArc((-29.128440367, -31.701392291), (-26.168694859, -33.412197692), (-25, -36.624844719))
            Line((-25, -36.624844719), (-25, -31.75))
            Line((-25, -31.75), (-28.575, -31.75))
        make_face()
    extrude(amount=FILLET4_DEPTH)


solid = part.part
